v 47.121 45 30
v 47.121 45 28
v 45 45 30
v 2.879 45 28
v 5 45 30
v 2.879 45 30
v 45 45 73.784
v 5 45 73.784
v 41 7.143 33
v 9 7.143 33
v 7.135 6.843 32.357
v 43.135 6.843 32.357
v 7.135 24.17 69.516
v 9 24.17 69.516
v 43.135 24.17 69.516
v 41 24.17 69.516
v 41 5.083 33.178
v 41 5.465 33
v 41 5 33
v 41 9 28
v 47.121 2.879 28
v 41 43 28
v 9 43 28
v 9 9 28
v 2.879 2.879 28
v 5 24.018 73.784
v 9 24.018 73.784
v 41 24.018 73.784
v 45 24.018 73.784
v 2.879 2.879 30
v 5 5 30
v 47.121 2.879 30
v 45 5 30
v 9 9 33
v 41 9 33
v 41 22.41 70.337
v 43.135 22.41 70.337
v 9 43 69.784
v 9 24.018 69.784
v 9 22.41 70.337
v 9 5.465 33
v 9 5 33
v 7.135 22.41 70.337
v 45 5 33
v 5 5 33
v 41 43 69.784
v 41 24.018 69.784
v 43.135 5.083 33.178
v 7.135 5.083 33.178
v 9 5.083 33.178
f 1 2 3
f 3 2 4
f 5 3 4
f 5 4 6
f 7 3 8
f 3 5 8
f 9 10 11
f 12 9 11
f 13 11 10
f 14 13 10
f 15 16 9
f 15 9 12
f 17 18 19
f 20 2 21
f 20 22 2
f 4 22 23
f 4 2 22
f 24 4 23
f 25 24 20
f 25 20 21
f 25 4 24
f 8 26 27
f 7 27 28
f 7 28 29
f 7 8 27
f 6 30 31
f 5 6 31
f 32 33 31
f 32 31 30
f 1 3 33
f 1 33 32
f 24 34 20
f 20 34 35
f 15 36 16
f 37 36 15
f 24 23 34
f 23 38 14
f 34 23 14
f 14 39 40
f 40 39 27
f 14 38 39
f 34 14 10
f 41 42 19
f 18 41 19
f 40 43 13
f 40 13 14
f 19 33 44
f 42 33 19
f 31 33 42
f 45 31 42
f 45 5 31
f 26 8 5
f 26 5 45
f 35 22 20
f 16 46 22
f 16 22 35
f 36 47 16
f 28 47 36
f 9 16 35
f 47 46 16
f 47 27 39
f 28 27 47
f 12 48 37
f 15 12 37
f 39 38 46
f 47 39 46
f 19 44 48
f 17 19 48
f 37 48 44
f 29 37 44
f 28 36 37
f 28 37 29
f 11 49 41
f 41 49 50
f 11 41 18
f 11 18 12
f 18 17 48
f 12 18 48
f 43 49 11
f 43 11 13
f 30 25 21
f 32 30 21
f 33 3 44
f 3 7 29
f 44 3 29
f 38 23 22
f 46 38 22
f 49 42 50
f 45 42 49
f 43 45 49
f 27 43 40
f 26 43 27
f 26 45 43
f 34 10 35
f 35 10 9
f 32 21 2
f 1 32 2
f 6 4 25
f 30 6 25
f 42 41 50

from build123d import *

# Parameters (mm, degrees)
SKETCH033_W             = 36
SKETCH033_H             = 41
SKETCH033_R             = 1.65
EXTRUDE035_DEPTH        = 2
SKETCH039_W             = 14.242
SKETCH039_H             = 2.925
EXTRUDE039_DEPTH        = 0.5
LINK007_PLACEMENT_ANGLE = 65
SKETCH040_W             = 40
SKETCH040_H             = 38
EXTRUDE041_DEPTH        = 2
EXTRUDE040_DEPTH        = 4
SKETCH041_W             = 40
SKETCH041_H             = 45.78385
EXTRUDE042_DEPTH        = 2
SKETCH042_W             = 34
SKETCH042_H             = 18.982178
EXTRUDE043_DEPTH        = 4
SKETCH043_W             = 40
SKETCH043_H             = 5
EXTRUDE044_DEPTH        = 4


with BuildPart() as extrude_displaycase_front:
    # Sketch033 → Extrude035 (new body)
    with BuildSketch(Plane.XY):
        with Locations((13.635, 13)):
            Rectangle(SKETCH033_W, SKETCH033_H)
        with Locations((3, 30.31)):
            Circle(SKETCH033_R, mode=Mode.SUBTRACT)
        with Locations((24.27, 30.31)):
            Circle(SKETCH033_R, mode=Mode.SUBTRACT)
        with Locations((3, -2)):
            Circle(SKETCH033_R, mode=Mode.SUBTRACT)
        with Locations((24.27, -2)):
            Circle(SKETCH033_R, mode=Mode.SUBTRACT)
        Polygon((27.37, 23.21), (27.37, 3.51), (-0.1, 3.51), (-0.1, 23.21), (6.514, 23.21), (6.514, 26.135), (20.756, 26.135), (20.756, 23.21), align=None, mode=Mode.SUBTRACT)
    extrude(amount=-EXTRUDE035_DEPTH)


with BuildPart() as fusion_displaycase_front001:
    # Sketch039 → Extrude039 (new body)
    with BuildSketch(Plane.XY):
        with Locations((13.635, 24.6725)):
            Rectangle(SKETCH039_W, SKETCH039_H)
    extrude(amount=-EXTRUDE039_DEPTH)

    # Fusion012: union Extrude_DisplayCase_Front
    add(extrude_displaycase_front.part)


with BuildPart() as fusion_displaycase_front001_1:
    # Link007 placement: moved
    add(fusion_displaycase_front001.part.moved(Location((6.5, 3.2, 12))).rotate(Axis((6.5, 3.2, 12), (1, 0, 0)), LINK007_PLACEMENT_ANGLE))


with BuildPart() as extrude_displaycase_bottom:
    # Sketch040 → Extrude041 (new body)
    with BuildSketch(Plane.XY):
        Polygon((40, 40), (0, 40), (-2.12132, 40), (-2.12132, -2.12132), (42.12132, -2.12132), (42.12132, 40), align=None)
        with Locations((20, 19)):
            Rectangle(SKETCH040_W, SKETCH040_H, mode=Mode.SUBTRACT)
    extrude(amount=EXTRUDE041_DEPTH)


with BuildPart() as extrude_displaycase_side:
    # Sketch032 → Extrude040 (new body)
    with BuildSketch(Plane.YZ):
        Polygon((0, 5), (19.017822, 45.78385), (40, 45.78385), (40, 5), (40, 0), (0, 0), align=None)
    extrude(amount=EXTRUDE040_DEPTH)


with BuildPart() as extrude_displaycase_side001:
    # Link006 base: copy of Extrude_DisplayCase_Side
    add(extrude_displaycase_side.part)


with BuildPart() as extrude_displaycase_side001_1:
    # Link006 placement: moved
    add(extrude_displaycase_side001.part.moved(Location((36, 0, 0))))


with BuildPart() as extrude_displaycase_back:
    # Sketch041 → Extrude042 (new body)
    with BuildSketch(Plane.XZ):
        with Locations((20, 22.891925)):
            Rectangle(SKETCH041_W, SKETCH041_H)
    extrude(amount=EXTRUDE042_DEPTH)


with BuildPart() as extrude_displaycase_back_1:
    # Extrude042 placement: moved
    add(extrude_displaycase_back.part.moved(Location((0, 40, 0))))


with BuildPart() as extrude_displaycase_top:
    # Sketch042 → Extrude043 (new body)
    with BuildSketch(Plane.XY):
        with Locations((21, 28.508911)):
            Rectangle(SKETCH042_W, SKETCH042_H)
    extrude(amount=-EXTRUDE043_DEPTH)


with BuildPart() as extrude_displaycase_top_1:
    # Extrude043 placement: moved
    add(extrude_displaycase_top.part.moved(Location((0, 0, 45.78385))))


with BuildPart() as extrude_displaycase_frontbottom:
    # Sketch043 → Extrude044 (new body)
    with BuildSketch(Plane.XZ):
        with Locations((20, 2.5)):
            Rectangle(SKETCH043_W, SKETCH043_H)
    extrude(amount=-EXTRUDE044_DEPTH)


with BuildPart() as cut_displaycase:
    # Fusion013 base: copy of Extrude_DisplayCase_Side
    add(extrude_displaycase_side.part)

    # Fusion013: union Extrude_DisplayCase_Bottom, Extrude_DisplayCase_Side001, Extrude_DisplayCase_Back, Extrude_DisplayCase_Top, Extrude_DisplayCase_FrontBottom
    add(extrude_displaycase_bottom.part)
    add(extrude_displaycase_side001_1.part)
    add(extrude_displaycase_back_1.part)
    add(extrude_displaycase_top_1.part)
    add(extrude_displaycase_frontbottom.part)

    # Cut010: cut Fusion_DisplayCase_Front001
    add(fusion_displaycase_front001_1.part, mode=Mode.SUBTRACT)


with BuildPart() as cut_displaycase_1:
    # Cut010 placement: moved
    add(cut_displaycase.part.moved(Location((5, 5, 28))))


solid = cut_displaycase_1.part
